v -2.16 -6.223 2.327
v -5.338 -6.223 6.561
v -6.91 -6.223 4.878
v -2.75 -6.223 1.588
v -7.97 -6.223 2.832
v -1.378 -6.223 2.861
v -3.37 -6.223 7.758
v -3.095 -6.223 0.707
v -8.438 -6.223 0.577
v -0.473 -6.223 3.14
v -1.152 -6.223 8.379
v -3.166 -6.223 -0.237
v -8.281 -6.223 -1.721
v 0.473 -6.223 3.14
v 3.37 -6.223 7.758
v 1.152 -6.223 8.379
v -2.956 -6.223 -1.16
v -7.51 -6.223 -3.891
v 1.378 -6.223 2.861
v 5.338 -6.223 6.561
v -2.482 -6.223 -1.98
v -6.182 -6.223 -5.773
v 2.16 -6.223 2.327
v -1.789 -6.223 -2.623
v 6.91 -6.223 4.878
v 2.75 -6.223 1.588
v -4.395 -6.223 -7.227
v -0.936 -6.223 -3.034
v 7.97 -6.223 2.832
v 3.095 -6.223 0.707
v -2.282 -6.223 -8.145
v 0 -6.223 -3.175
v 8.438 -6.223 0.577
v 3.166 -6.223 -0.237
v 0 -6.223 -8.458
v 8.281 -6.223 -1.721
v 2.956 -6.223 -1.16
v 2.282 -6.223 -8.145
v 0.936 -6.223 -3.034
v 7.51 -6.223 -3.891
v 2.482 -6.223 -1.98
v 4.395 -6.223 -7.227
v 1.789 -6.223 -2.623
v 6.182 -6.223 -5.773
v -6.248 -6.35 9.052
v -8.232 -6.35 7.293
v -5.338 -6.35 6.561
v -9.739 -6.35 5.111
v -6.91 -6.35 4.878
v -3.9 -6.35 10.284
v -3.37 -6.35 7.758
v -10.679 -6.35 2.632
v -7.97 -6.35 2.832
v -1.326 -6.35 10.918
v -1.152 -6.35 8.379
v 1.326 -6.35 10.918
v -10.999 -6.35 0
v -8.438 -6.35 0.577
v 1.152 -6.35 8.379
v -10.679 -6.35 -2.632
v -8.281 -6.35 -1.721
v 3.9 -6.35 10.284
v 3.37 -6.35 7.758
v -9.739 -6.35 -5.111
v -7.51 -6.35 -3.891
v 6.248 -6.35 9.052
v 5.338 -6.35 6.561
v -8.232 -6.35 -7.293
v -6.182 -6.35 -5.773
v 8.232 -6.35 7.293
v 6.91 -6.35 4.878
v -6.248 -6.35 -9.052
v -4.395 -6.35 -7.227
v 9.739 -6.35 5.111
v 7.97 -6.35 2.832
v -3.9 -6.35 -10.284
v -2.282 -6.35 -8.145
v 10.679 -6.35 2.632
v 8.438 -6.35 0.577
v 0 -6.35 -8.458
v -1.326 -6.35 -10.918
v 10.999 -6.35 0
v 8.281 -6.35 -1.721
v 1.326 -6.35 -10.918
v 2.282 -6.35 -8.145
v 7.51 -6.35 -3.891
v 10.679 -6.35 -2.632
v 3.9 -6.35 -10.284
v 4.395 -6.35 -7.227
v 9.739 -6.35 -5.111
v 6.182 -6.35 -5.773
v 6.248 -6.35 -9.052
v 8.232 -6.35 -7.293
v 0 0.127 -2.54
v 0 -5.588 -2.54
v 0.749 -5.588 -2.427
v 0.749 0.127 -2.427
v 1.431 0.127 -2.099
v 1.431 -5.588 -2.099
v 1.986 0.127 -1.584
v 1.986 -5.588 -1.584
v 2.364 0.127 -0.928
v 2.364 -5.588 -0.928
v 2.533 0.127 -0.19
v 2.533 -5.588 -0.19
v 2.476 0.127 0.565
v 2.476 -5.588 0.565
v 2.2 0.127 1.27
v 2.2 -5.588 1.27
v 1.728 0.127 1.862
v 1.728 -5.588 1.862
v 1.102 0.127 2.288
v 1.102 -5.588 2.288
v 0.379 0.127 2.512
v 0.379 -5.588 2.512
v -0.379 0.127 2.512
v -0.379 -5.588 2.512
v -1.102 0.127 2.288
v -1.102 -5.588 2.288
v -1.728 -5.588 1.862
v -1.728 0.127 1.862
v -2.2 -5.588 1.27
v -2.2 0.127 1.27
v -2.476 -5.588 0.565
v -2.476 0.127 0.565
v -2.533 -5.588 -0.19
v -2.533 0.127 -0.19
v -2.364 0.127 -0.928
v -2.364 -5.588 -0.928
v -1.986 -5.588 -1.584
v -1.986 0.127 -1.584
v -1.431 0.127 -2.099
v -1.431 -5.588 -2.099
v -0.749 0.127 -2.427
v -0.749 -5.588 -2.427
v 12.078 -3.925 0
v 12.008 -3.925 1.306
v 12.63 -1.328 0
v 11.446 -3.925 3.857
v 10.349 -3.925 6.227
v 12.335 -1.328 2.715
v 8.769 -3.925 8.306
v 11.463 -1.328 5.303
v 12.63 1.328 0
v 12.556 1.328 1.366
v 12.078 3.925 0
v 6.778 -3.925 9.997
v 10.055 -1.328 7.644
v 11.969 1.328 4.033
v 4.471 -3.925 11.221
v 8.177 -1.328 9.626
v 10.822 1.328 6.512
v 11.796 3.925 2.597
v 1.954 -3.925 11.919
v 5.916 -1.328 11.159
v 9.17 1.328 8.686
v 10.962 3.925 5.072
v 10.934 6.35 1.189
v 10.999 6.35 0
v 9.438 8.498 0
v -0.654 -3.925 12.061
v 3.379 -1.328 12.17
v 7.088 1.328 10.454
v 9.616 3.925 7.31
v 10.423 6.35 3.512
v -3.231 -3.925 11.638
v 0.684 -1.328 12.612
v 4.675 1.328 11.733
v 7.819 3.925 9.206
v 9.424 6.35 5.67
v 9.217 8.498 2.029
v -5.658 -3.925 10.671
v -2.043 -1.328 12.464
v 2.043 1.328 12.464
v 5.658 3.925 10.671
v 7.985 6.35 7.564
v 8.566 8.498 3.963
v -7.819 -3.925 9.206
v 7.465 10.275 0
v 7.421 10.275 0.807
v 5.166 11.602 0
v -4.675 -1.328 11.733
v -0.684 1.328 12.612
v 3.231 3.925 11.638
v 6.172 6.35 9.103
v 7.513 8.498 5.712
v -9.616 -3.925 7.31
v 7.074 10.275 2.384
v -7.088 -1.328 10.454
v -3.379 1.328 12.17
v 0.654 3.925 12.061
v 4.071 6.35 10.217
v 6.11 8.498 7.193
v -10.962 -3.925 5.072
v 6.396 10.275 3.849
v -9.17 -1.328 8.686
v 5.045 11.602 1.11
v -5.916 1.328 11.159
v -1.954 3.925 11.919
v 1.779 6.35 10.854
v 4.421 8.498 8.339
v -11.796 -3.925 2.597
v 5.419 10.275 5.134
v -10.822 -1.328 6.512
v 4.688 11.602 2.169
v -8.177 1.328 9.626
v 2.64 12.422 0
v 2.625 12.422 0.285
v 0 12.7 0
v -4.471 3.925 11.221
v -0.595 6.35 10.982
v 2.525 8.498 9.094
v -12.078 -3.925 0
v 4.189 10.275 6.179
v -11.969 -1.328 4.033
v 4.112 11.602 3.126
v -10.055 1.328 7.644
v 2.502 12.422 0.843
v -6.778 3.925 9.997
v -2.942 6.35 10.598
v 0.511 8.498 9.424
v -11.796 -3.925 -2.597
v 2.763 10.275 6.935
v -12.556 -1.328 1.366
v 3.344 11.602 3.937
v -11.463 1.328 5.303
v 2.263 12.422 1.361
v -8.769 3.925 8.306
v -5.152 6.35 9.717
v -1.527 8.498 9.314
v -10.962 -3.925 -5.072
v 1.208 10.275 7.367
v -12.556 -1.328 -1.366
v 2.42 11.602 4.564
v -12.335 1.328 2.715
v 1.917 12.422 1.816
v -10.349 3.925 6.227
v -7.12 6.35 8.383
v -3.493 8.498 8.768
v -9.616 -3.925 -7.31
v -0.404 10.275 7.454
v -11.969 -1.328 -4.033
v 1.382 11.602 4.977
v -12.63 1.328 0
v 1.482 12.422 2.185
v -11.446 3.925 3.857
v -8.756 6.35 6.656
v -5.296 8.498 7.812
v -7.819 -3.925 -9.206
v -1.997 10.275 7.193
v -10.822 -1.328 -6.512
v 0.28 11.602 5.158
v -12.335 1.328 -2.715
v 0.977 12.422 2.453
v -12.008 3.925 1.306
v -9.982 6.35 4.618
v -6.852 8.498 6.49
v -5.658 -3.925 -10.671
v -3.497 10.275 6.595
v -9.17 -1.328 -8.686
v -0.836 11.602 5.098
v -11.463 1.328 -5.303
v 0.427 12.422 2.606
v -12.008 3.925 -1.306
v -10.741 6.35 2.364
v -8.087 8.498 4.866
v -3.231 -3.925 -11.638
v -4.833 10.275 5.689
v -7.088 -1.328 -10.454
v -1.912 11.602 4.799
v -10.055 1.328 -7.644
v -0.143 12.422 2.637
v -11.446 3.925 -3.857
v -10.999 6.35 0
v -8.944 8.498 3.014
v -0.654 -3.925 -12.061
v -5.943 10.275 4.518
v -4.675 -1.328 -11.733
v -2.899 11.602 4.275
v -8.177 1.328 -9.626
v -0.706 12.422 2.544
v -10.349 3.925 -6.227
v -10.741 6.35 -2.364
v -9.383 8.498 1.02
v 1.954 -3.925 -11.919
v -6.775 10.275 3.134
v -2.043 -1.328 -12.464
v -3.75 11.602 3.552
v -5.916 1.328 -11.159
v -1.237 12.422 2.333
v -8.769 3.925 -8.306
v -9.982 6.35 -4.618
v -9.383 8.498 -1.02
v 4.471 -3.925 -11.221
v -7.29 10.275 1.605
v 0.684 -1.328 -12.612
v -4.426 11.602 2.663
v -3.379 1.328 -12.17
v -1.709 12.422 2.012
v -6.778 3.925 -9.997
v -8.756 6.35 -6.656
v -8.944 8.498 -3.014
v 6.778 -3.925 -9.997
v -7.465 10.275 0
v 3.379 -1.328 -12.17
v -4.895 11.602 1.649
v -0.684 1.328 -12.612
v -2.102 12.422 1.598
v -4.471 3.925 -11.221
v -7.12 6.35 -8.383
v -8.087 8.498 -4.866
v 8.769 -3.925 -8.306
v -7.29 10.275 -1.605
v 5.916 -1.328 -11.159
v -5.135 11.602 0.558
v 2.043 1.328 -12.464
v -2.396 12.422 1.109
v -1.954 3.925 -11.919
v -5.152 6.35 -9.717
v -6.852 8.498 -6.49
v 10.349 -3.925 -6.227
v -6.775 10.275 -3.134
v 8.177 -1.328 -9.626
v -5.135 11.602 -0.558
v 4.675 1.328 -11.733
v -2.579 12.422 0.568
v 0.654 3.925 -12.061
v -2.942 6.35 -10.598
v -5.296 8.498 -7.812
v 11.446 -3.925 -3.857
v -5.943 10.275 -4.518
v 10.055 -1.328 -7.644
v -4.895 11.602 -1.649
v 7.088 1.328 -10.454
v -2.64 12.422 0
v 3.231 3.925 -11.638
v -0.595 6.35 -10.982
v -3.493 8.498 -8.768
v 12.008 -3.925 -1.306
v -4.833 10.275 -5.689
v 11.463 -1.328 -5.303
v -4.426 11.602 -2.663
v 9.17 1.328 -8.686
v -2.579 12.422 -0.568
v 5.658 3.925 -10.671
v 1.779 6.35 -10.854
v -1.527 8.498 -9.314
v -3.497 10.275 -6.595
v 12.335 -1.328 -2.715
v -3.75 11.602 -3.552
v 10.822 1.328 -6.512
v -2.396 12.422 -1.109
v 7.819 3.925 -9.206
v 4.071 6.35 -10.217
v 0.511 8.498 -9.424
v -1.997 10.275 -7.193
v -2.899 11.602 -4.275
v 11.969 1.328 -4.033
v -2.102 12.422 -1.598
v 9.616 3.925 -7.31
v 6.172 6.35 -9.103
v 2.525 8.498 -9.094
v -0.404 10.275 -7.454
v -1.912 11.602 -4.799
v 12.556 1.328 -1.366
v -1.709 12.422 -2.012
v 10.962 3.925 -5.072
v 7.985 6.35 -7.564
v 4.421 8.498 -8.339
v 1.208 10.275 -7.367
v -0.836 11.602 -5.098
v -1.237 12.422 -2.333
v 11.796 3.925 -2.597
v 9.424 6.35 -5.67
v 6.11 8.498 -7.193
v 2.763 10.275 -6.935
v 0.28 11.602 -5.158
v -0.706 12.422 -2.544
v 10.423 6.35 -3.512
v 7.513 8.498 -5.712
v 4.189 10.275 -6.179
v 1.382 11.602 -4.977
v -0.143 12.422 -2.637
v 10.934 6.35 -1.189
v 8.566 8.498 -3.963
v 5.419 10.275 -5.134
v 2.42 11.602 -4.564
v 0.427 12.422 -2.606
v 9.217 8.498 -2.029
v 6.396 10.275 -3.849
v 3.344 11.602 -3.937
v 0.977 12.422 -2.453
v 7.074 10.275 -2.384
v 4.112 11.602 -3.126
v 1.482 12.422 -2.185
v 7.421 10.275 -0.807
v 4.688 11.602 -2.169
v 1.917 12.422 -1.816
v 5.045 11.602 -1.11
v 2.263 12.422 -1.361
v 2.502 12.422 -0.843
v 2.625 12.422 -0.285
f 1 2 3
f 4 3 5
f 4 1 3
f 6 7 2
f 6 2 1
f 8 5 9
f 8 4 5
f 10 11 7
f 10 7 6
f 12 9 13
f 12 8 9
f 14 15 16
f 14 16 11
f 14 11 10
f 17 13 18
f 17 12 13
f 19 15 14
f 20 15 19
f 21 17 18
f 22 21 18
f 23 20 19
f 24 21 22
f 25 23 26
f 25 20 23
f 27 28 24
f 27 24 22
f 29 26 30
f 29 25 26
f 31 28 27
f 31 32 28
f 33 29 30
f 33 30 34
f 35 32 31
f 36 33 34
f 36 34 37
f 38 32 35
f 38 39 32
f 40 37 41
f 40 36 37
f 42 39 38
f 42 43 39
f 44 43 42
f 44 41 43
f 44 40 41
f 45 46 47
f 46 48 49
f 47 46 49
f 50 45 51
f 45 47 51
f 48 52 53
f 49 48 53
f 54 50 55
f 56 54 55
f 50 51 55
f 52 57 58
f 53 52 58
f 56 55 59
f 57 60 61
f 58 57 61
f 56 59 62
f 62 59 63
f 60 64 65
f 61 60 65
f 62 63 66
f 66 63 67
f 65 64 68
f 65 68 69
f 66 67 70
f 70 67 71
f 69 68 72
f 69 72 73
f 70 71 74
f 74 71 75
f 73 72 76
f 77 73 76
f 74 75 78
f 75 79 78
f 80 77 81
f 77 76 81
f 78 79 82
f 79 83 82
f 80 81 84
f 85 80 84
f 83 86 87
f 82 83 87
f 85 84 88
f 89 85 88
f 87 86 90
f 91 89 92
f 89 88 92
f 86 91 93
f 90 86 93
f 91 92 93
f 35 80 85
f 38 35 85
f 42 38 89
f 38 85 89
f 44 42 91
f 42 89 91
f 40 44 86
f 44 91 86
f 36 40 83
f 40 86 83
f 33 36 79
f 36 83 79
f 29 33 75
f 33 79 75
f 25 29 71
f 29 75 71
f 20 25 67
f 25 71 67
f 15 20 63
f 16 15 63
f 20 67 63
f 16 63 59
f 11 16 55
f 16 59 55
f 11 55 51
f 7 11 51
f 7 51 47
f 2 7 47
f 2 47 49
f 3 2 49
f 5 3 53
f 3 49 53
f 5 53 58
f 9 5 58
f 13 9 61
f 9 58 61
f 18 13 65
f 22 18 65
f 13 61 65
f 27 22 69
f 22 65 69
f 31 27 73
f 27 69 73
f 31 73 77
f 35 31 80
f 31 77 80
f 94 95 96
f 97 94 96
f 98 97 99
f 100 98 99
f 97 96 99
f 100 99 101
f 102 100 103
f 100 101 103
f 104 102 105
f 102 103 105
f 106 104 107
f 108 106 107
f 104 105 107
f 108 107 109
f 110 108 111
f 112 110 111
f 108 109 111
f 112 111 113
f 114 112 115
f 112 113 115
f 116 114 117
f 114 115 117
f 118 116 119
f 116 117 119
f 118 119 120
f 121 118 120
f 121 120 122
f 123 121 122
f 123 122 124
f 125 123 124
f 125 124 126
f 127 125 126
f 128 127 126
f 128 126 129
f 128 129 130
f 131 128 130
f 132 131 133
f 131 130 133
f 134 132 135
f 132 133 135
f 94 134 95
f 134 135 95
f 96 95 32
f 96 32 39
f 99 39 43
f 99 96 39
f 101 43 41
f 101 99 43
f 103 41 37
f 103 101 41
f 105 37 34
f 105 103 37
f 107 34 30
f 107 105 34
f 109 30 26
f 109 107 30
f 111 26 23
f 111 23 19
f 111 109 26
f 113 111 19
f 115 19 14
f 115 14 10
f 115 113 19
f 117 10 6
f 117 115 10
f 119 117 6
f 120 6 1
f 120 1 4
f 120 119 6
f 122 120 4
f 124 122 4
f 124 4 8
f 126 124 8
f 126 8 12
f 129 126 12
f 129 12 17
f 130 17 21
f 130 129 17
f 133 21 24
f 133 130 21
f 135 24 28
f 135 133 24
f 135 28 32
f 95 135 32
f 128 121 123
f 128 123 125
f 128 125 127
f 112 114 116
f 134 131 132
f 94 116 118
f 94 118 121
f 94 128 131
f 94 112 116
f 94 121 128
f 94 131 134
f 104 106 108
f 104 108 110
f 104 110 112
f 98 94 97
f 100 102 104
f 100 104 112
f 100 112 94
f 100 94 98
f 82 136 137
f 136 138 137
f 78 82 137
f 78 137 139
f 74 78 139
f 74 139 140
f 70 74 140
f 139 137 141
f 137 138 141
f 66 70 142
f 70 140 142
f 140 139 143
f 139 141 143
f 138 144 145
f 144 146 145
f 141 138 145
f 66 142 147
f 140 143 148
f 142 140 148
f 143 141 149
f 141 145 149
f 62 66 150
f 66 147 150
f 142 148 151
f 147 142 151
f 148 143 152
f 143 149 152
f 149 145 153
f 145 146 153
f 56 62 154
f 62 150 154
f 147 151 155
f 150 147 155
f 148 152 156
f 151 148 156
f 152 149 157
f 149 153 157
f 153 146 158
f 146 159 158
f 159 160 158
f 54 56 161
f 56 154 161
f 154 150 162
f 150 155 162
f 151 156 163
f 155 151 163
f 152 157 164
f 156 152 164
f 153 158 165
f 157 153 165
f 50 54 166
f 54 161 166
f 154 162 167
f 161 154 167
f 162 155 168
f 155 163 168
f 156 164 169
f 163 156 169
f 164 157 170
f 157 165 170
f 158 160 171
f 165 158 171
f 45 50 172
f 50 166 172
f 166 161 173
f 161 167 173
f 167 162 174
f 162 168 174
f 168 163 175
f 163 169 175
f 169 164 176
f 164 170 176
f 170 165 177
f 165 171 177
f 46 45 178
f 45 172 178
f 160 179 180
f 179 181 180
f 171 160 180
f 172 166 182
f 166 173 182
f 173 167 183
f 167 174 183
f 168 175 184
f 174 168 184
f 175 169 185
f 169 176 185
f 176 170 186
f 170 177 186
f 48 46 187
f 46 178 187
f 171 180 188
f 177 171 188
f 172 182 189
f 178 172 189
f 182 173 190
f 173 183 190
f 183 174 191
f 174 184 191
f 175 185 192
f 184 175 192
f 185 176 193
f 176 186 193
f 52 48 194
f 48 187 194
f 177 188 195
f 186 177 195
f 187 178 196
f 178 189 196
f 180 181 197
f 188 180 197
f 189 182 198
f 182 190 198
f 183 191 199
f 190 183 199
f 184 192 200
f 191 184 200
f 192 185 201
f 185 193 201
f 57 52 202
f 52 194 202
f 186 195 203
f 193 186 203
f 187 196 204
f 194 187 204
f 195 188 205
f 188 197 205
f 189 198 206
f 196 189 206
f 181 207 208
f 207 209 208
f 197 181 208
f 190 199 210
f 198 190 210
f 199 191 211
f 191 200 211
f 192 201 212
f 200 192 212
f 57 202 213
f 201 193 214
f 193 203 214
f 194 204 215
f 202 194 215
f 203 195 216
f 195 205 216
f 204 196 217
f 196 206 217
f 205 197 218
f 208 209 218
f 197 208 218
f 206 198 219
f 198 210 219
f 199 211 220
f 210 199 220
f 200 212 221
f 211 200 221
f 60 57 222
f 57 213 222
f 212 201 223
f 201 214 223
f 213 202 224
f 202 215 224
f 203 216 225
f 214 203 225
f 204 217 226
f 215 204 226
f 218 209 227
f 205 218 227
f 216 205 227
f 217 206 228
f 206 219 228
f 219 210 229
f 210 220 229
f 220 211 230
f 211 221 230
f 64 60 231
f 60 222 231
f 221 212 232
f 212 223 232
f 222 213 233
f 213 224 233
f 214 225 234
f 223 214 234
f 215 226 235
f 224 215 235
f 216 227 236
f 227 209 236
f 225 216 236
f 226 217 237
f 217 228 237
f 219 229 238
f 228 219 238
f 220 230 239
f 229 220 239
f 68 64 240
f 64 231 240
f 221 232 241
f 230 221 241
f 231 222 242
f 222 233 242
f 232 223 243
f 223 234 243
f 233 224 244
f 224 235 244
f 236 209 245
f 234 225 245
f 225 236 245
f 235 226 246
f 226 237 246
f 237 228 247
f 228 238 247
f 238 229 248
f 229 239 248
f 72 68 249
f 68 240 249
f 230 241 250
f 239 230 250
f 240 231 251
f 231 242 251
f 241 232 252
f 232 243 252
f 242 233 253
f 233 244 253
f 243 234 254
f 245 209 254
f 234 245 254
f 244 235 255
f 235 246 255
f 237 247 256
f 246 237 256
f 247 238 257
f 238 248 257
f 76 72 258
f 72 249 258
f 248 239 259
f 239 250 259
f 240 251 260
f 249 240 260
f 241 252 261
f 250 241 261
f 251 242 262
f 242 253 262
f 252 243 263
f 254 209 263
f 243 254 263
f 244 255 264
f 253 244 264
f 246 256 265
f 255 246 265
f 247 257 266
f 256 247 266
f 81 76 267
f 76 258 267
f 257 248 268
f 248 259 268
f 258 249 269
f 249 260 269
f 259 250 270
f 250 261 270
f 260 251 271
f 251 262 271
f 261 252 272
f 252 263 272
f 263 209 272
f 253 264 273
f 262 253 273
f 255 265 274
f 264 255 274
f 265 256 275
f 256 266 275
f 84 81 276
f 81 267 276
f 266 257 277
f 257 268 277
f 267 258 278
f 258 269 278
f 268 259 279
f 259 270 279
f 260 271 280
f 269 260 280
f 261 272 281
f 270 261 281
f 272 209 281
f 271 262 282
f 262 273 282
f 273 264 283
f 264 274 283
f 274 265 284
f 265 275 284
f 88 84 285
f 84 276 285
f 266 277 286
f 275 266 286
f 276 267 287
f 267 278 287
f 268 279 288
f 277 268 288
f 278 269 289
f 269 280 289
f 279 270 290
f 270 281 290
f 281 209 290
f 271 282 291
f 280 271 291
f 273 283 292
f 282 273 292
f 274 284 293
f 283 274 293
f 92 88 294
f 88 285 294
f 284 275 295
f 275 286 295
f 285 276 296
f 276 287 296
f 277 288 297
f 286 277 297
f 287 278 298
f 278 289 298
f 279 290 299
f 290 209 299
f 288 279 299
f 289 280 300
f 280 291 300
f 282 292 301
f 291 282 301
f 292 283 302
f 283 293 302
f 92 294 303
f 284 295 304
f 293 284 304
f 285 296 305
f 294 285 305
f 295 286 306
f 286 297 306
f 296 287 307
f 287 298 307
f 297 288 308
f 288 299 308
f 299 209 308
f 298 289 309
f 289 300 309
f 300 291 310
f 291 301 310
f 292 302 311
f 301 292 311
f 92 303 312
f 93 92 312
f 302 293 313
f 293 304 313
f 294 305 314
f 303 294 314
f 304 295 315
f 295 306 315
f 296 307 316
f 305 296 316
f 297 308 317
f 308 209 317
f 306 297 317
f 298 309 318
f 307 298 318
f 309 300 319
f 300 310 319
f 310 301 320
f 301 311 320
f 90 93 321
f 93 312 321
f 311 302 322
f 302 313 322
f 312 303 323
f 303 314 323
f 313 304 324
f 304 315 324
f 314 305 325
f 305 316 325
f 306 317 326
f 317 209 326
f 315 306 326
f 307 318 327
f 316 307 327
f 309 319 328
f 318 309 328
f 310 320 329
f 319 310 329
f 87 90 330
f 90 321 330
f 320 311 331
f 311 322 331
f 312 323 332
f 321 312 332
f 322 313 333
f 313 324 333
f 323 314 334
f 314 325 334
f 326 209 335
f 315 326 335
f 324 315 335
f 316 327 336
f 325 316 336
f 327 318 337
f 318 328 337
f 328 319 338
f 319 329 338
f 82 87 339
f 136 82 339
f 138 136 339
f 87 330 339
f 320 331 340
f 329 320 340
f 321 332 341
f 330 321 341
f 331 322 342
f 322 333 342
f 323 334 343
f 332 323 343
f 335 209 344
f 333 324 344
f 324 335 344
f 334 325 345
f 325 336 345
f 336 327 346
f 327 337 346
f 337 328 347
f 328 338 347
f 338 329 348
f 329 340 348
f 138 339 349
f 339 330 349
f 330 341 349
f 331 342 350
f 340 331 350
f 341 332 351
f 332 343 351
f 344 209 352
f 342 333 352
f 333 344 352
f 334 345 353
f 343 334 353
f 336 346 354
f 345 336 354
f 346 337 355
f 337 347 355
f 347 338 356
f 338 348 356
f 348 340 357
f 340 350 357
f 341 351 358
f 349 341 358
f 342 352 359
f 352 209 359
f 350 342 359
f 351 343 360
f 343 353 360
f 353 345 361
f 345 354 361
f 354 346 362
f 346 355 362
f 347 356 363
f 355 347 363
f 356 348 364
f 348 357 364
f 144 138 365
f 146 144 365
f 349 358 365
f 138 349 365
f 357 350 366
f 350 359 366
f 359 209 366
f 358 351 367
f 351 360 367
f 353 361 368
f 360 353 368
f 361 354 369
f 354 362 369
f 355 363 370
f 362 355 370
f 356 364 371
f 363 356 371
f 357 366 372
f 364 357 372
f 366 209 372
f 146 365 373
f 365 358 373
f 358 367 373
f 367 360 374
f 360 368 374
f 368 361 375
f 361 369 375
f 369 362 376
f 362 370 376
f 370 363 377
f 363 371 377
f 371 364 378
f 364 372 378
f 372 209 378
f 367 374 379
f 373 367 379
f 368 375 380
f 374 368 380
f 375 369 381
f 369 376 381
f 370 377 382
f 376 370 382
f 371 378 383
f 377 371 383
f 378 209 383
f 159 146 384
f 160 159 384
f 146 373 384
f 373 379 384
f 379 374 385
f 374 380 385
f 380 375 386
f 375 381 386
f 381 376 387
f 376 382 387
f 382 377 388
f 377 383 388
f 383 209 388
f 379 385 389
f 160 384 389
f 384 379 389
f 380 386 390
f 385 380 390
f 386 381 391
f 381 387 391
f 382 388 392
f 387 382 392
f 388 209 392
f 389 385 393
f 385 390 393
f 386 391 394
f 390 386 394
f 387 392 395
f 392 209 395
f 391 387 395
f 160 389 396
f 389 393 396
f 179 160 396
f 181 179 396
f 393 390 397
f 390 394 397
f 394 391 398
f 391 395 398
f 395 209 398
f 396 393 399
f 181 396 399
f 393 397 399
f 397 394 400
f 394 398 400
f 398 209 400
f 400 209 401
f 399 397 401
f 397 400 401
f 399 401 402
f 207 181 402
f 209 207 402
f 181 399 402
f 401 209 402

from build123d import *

# Parameters (mm, degrees)
TRUNCATED_BALL_DEPTH      = 13.7
TRUNCATED_BALL_DEPTH_BACK = 13.7
SKETCH3_R                 = 8.4582
RECESSED_DEPTH            = 0.127
SKETCH4_R                 = 2.54
THREADED_DEPTH            = 6.35
CHAMFER2_SIZE             = 0.635


with BuildPart() as part:
    # Sketch1 → Complete_Ball (revolve)
    with BuildSketch(Plane.XY):
        with BuildLine():
            Line((0, 12.7), (0, -12.7))
            ThreePointArc((0, -12.7), (12.7, 0), (0, 12.7))
        make_face()
    revolve(axis=Axis((0, 13.6525, 0), (0, -1, 0)))

    # Sketch2 → Truncated_ball (cut, two sides)
    with BuildSketch(Plane.XY) as truncated_ball_sk:
        with BuildLine():
            Line((-10.998522628, -6.35), (10.998522628, -6.35))
            ThreePointArc((10.998522628, -6.35), (0, -12.7), (-10.998522628, -6.35))
        make_face()
    extrude(amount=TRUNCATED_BALL_DEPTH, mode=Mode.SUBTRACT)
    extrude(truncated_ball_sk.sketch, amount=-TRUNCATED_BALL_DEPTH_BACK, mode=Mode.SUBTRACT)

    # Sketch3 → Recessed (cut)
    with BuildSketch(Plane.XZ.offset(6.35)):
        with Locations(Location((0, 0, 0), (0, 0, 270))):  # turned: the seam where the file's is
            Circle(SKETCH3_R)
    extrude(amount=-RECESSED_DEPTH, mode=Mode.SUBTRACT)

    # Sketch4 → Threaded (cut)
    with BuildSketch(Plane.XZ.offset(6.223)):
        with Locations(Location((0, 0, 0), (0, 0, 270))):  # turned: the seam where the file's is
            Circle(SKETCH4_R)
    extrude(amount=-THREADED_DEPTH, mode=Mode.SUBTRACT)

    # Chamfer2
    chamfer2_edges = [part.edges().sort_by_distance(p)[0] for p in [
        (0, -6.223, 2.54),
    ]]
    chamfer(chamfer2_edges, length=CHAMFER2_SIZE)


solid = part.part
